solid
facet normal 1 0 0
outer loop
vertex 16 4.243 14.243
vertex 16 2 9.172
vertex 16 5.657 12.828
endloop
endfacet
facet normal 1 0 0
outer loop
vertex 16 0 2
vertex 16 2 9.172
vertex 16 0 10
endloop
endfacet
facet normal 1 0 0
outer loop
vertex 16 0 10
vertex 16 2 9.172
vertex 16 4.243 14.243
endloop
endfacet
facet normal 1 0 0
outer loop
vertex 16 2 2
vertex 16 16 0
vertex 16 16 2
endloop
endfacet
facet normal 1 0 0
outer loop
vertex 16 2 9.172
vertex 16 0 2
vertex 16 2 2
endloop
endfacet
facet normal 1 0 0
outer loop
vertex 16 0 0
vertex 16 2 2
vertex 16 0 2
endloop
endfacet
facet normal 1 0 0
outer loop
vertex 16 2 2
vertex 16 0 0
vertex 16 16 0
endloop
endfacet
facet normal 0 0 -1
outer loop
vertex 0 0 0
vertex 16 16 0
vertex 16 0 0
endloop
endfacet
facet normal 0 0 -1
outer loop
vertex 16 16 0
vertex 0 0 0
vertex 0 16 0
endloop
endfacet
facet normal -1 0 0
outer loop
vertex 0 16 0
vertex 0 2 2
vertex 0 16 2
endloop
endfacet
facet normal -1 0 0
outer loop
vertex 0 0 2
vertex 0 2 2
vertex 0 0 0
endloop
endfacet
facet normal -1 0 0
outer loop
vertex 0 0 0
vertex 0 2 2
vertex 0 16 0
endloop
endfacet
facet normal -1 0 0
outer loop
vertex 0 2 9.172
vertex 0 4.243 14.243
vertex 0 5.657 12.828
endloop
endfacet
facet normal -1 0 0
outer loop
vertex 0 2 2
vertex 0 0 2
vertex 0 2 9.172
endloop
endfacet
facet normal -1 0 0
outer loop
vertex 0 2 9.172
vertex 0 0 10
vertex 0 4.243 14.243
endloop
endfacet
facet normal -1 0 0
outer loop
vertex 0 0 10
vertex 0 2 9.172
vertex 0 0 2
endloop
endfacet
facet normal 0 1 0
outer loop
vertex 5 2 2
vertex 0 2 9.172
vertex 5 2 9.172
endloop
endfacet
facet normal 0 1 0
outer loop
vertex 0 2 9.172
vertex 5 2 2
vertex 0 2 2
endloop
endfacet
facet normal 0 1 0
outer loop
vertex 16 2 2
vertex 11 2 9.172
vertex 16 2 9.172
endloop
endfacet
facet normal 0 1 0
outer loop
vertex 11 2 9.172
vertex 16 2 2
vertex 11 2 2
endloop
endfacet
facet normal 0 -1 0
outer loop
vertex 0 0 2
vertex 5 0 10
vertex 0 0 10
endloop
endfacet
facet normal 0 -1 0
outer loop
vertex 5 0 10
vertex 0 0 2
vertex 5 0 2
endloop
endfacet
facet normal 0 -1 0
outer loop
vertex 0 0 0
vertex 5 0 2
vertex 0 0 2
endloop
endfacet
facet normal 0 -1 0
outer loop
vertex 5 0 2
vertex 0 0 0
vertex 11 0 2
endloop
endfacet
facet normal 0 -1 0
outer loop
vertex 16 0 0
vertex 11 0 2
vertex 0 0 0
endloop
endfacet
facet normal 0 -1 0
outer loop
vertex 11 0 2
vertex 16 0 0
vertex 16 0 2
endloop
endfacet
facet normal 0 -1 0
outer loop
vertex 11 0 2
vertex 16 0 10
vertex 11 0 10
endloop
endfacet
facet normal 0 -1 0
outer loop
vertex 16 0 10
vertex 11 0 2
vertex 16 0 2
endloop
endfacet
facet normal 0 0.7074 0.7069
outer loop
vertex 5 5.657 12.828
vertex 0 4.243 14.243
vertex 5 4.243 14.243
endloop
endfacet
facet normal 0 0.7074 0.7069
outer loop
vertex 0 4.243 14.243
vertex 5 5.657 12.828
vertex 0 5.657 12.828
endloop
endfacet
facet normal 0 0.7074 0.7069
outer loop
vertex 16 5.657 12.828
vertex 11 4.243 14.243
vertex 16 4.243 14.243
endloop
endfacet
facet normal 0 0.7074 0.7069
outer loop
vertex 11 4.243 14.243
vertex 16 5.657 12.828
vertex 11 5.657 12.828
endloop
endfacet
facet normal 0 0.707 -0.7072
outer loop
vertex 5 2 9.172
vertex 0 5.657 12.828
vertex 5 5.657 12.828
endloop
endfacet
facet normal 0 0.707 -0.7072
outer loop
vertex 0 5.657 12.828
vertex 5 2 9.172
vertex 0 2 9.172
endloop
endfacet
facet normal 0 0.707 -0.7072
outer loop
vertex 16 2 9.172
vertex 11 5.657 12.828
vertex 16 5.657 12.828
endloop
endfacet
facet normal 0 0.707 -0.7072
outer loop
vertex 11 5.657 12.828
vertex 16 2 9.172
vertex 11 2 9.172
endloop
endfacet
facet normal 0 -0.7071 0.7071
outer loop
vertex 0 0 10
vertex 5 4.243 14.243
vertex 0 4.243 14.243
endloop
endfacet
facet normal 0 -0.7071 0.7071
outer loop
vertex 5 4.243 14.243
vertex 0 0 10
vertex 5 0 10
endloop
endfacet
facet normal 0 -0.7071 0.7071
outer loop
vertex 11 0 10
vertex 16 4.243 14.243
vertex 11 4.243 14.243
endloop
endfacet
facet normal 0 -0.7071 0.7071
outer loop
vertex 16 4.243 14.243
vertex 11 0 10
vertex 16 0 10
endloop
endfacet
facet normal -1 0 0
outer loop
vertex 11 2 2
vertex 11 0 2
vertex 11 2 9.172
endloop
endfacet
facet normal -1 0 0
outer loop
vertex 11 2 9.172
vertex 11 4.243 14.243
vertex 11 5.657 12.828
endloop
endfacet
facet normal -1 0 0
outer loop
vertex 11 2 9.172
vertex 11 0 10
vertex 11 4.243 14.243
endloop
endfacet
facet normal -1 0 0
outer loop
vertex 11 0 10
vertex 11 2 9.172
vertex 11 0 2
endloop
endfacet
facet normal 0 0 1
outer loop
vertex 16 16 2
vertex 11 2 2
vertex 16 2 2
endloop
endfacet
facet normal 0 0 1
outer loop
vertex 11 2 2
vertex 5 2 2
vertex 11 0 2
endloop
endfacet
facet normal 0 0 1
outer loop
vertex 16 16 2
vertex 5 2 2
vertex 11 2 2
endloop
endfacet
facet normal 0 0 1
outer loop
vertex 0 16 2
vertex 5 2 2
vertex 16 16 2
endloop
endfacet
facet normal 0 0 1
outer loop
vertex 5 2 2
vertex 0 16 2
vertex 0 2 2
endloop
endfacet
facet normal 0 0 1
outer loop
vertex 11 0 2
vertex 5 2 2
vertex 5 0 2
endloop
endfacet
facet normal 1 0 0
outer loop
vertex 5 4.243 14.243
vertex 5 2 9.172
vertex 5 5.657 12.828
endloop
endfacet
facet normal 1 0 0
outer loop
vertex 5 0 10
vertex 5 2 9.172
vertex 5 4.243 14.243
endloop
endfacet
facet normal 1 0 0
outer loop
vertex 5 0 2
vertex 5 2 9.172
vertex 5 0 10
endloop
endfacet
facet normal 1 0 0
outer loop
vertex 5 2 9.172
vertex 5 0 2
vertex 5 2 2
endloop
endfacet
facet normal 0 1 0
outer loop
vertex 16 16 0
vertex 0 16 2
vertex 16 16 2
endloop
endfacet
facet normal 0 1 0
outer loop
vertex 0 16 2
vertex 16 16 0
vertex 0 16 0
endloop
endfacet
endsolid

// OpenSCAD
// Size of base
base = 16; //[10:200]

// Size of gap for cable to pass through (Must be less than the base!)
gap = 6; //[195]

// Thickness of all parts, higher values are stronger but take longer
thickness = 2; //[1:6]

// Length of straight part of the cable holder
armLength = 8; //[2:40]

// Angle of arngled portion of the cable holder
armAngle = 45; //[45]

// Length of cable holder after the bend
armBent = 6; //[20]

difference(){
union(){
cube([base,base,thickness]);

/*
difference(){
union(){
union(){
cube([(base/2)-(gap/2),2,10]);
translate([(base/2)+(gap/2),0,0])
cube([(base/2)-(gap/2),2,10]);
}
translate([0,0,10])
rotate([-45,0,0])
union(){
cube([(base/2)-(gap/2),2,8]);
translate([(base/2)+(gap/2),0,0])
cube([(base/2)-(gap/2),2,8]);
}
}
translate([-base*2,-10,0])
cube([(base*4),10,80]);
}*/

difference(){
union(){
cube([base,thickness,armLength+thickness]);
    
translate([0,0,armLength+thickness])
rotate([-armAngle,0,0])
cube([base,thickness,armBent]);
}

translate([-base*2,-10,0])
cube([(base*4),10,80]);

translate([base/2-gap/2,-1,thickness])
cube([gap,base*(armBent+armLength)*2,armLength+armBent+1]);
}

}
translate([-1,-1,-1])
cube([base*2,base*2,1]);
}
